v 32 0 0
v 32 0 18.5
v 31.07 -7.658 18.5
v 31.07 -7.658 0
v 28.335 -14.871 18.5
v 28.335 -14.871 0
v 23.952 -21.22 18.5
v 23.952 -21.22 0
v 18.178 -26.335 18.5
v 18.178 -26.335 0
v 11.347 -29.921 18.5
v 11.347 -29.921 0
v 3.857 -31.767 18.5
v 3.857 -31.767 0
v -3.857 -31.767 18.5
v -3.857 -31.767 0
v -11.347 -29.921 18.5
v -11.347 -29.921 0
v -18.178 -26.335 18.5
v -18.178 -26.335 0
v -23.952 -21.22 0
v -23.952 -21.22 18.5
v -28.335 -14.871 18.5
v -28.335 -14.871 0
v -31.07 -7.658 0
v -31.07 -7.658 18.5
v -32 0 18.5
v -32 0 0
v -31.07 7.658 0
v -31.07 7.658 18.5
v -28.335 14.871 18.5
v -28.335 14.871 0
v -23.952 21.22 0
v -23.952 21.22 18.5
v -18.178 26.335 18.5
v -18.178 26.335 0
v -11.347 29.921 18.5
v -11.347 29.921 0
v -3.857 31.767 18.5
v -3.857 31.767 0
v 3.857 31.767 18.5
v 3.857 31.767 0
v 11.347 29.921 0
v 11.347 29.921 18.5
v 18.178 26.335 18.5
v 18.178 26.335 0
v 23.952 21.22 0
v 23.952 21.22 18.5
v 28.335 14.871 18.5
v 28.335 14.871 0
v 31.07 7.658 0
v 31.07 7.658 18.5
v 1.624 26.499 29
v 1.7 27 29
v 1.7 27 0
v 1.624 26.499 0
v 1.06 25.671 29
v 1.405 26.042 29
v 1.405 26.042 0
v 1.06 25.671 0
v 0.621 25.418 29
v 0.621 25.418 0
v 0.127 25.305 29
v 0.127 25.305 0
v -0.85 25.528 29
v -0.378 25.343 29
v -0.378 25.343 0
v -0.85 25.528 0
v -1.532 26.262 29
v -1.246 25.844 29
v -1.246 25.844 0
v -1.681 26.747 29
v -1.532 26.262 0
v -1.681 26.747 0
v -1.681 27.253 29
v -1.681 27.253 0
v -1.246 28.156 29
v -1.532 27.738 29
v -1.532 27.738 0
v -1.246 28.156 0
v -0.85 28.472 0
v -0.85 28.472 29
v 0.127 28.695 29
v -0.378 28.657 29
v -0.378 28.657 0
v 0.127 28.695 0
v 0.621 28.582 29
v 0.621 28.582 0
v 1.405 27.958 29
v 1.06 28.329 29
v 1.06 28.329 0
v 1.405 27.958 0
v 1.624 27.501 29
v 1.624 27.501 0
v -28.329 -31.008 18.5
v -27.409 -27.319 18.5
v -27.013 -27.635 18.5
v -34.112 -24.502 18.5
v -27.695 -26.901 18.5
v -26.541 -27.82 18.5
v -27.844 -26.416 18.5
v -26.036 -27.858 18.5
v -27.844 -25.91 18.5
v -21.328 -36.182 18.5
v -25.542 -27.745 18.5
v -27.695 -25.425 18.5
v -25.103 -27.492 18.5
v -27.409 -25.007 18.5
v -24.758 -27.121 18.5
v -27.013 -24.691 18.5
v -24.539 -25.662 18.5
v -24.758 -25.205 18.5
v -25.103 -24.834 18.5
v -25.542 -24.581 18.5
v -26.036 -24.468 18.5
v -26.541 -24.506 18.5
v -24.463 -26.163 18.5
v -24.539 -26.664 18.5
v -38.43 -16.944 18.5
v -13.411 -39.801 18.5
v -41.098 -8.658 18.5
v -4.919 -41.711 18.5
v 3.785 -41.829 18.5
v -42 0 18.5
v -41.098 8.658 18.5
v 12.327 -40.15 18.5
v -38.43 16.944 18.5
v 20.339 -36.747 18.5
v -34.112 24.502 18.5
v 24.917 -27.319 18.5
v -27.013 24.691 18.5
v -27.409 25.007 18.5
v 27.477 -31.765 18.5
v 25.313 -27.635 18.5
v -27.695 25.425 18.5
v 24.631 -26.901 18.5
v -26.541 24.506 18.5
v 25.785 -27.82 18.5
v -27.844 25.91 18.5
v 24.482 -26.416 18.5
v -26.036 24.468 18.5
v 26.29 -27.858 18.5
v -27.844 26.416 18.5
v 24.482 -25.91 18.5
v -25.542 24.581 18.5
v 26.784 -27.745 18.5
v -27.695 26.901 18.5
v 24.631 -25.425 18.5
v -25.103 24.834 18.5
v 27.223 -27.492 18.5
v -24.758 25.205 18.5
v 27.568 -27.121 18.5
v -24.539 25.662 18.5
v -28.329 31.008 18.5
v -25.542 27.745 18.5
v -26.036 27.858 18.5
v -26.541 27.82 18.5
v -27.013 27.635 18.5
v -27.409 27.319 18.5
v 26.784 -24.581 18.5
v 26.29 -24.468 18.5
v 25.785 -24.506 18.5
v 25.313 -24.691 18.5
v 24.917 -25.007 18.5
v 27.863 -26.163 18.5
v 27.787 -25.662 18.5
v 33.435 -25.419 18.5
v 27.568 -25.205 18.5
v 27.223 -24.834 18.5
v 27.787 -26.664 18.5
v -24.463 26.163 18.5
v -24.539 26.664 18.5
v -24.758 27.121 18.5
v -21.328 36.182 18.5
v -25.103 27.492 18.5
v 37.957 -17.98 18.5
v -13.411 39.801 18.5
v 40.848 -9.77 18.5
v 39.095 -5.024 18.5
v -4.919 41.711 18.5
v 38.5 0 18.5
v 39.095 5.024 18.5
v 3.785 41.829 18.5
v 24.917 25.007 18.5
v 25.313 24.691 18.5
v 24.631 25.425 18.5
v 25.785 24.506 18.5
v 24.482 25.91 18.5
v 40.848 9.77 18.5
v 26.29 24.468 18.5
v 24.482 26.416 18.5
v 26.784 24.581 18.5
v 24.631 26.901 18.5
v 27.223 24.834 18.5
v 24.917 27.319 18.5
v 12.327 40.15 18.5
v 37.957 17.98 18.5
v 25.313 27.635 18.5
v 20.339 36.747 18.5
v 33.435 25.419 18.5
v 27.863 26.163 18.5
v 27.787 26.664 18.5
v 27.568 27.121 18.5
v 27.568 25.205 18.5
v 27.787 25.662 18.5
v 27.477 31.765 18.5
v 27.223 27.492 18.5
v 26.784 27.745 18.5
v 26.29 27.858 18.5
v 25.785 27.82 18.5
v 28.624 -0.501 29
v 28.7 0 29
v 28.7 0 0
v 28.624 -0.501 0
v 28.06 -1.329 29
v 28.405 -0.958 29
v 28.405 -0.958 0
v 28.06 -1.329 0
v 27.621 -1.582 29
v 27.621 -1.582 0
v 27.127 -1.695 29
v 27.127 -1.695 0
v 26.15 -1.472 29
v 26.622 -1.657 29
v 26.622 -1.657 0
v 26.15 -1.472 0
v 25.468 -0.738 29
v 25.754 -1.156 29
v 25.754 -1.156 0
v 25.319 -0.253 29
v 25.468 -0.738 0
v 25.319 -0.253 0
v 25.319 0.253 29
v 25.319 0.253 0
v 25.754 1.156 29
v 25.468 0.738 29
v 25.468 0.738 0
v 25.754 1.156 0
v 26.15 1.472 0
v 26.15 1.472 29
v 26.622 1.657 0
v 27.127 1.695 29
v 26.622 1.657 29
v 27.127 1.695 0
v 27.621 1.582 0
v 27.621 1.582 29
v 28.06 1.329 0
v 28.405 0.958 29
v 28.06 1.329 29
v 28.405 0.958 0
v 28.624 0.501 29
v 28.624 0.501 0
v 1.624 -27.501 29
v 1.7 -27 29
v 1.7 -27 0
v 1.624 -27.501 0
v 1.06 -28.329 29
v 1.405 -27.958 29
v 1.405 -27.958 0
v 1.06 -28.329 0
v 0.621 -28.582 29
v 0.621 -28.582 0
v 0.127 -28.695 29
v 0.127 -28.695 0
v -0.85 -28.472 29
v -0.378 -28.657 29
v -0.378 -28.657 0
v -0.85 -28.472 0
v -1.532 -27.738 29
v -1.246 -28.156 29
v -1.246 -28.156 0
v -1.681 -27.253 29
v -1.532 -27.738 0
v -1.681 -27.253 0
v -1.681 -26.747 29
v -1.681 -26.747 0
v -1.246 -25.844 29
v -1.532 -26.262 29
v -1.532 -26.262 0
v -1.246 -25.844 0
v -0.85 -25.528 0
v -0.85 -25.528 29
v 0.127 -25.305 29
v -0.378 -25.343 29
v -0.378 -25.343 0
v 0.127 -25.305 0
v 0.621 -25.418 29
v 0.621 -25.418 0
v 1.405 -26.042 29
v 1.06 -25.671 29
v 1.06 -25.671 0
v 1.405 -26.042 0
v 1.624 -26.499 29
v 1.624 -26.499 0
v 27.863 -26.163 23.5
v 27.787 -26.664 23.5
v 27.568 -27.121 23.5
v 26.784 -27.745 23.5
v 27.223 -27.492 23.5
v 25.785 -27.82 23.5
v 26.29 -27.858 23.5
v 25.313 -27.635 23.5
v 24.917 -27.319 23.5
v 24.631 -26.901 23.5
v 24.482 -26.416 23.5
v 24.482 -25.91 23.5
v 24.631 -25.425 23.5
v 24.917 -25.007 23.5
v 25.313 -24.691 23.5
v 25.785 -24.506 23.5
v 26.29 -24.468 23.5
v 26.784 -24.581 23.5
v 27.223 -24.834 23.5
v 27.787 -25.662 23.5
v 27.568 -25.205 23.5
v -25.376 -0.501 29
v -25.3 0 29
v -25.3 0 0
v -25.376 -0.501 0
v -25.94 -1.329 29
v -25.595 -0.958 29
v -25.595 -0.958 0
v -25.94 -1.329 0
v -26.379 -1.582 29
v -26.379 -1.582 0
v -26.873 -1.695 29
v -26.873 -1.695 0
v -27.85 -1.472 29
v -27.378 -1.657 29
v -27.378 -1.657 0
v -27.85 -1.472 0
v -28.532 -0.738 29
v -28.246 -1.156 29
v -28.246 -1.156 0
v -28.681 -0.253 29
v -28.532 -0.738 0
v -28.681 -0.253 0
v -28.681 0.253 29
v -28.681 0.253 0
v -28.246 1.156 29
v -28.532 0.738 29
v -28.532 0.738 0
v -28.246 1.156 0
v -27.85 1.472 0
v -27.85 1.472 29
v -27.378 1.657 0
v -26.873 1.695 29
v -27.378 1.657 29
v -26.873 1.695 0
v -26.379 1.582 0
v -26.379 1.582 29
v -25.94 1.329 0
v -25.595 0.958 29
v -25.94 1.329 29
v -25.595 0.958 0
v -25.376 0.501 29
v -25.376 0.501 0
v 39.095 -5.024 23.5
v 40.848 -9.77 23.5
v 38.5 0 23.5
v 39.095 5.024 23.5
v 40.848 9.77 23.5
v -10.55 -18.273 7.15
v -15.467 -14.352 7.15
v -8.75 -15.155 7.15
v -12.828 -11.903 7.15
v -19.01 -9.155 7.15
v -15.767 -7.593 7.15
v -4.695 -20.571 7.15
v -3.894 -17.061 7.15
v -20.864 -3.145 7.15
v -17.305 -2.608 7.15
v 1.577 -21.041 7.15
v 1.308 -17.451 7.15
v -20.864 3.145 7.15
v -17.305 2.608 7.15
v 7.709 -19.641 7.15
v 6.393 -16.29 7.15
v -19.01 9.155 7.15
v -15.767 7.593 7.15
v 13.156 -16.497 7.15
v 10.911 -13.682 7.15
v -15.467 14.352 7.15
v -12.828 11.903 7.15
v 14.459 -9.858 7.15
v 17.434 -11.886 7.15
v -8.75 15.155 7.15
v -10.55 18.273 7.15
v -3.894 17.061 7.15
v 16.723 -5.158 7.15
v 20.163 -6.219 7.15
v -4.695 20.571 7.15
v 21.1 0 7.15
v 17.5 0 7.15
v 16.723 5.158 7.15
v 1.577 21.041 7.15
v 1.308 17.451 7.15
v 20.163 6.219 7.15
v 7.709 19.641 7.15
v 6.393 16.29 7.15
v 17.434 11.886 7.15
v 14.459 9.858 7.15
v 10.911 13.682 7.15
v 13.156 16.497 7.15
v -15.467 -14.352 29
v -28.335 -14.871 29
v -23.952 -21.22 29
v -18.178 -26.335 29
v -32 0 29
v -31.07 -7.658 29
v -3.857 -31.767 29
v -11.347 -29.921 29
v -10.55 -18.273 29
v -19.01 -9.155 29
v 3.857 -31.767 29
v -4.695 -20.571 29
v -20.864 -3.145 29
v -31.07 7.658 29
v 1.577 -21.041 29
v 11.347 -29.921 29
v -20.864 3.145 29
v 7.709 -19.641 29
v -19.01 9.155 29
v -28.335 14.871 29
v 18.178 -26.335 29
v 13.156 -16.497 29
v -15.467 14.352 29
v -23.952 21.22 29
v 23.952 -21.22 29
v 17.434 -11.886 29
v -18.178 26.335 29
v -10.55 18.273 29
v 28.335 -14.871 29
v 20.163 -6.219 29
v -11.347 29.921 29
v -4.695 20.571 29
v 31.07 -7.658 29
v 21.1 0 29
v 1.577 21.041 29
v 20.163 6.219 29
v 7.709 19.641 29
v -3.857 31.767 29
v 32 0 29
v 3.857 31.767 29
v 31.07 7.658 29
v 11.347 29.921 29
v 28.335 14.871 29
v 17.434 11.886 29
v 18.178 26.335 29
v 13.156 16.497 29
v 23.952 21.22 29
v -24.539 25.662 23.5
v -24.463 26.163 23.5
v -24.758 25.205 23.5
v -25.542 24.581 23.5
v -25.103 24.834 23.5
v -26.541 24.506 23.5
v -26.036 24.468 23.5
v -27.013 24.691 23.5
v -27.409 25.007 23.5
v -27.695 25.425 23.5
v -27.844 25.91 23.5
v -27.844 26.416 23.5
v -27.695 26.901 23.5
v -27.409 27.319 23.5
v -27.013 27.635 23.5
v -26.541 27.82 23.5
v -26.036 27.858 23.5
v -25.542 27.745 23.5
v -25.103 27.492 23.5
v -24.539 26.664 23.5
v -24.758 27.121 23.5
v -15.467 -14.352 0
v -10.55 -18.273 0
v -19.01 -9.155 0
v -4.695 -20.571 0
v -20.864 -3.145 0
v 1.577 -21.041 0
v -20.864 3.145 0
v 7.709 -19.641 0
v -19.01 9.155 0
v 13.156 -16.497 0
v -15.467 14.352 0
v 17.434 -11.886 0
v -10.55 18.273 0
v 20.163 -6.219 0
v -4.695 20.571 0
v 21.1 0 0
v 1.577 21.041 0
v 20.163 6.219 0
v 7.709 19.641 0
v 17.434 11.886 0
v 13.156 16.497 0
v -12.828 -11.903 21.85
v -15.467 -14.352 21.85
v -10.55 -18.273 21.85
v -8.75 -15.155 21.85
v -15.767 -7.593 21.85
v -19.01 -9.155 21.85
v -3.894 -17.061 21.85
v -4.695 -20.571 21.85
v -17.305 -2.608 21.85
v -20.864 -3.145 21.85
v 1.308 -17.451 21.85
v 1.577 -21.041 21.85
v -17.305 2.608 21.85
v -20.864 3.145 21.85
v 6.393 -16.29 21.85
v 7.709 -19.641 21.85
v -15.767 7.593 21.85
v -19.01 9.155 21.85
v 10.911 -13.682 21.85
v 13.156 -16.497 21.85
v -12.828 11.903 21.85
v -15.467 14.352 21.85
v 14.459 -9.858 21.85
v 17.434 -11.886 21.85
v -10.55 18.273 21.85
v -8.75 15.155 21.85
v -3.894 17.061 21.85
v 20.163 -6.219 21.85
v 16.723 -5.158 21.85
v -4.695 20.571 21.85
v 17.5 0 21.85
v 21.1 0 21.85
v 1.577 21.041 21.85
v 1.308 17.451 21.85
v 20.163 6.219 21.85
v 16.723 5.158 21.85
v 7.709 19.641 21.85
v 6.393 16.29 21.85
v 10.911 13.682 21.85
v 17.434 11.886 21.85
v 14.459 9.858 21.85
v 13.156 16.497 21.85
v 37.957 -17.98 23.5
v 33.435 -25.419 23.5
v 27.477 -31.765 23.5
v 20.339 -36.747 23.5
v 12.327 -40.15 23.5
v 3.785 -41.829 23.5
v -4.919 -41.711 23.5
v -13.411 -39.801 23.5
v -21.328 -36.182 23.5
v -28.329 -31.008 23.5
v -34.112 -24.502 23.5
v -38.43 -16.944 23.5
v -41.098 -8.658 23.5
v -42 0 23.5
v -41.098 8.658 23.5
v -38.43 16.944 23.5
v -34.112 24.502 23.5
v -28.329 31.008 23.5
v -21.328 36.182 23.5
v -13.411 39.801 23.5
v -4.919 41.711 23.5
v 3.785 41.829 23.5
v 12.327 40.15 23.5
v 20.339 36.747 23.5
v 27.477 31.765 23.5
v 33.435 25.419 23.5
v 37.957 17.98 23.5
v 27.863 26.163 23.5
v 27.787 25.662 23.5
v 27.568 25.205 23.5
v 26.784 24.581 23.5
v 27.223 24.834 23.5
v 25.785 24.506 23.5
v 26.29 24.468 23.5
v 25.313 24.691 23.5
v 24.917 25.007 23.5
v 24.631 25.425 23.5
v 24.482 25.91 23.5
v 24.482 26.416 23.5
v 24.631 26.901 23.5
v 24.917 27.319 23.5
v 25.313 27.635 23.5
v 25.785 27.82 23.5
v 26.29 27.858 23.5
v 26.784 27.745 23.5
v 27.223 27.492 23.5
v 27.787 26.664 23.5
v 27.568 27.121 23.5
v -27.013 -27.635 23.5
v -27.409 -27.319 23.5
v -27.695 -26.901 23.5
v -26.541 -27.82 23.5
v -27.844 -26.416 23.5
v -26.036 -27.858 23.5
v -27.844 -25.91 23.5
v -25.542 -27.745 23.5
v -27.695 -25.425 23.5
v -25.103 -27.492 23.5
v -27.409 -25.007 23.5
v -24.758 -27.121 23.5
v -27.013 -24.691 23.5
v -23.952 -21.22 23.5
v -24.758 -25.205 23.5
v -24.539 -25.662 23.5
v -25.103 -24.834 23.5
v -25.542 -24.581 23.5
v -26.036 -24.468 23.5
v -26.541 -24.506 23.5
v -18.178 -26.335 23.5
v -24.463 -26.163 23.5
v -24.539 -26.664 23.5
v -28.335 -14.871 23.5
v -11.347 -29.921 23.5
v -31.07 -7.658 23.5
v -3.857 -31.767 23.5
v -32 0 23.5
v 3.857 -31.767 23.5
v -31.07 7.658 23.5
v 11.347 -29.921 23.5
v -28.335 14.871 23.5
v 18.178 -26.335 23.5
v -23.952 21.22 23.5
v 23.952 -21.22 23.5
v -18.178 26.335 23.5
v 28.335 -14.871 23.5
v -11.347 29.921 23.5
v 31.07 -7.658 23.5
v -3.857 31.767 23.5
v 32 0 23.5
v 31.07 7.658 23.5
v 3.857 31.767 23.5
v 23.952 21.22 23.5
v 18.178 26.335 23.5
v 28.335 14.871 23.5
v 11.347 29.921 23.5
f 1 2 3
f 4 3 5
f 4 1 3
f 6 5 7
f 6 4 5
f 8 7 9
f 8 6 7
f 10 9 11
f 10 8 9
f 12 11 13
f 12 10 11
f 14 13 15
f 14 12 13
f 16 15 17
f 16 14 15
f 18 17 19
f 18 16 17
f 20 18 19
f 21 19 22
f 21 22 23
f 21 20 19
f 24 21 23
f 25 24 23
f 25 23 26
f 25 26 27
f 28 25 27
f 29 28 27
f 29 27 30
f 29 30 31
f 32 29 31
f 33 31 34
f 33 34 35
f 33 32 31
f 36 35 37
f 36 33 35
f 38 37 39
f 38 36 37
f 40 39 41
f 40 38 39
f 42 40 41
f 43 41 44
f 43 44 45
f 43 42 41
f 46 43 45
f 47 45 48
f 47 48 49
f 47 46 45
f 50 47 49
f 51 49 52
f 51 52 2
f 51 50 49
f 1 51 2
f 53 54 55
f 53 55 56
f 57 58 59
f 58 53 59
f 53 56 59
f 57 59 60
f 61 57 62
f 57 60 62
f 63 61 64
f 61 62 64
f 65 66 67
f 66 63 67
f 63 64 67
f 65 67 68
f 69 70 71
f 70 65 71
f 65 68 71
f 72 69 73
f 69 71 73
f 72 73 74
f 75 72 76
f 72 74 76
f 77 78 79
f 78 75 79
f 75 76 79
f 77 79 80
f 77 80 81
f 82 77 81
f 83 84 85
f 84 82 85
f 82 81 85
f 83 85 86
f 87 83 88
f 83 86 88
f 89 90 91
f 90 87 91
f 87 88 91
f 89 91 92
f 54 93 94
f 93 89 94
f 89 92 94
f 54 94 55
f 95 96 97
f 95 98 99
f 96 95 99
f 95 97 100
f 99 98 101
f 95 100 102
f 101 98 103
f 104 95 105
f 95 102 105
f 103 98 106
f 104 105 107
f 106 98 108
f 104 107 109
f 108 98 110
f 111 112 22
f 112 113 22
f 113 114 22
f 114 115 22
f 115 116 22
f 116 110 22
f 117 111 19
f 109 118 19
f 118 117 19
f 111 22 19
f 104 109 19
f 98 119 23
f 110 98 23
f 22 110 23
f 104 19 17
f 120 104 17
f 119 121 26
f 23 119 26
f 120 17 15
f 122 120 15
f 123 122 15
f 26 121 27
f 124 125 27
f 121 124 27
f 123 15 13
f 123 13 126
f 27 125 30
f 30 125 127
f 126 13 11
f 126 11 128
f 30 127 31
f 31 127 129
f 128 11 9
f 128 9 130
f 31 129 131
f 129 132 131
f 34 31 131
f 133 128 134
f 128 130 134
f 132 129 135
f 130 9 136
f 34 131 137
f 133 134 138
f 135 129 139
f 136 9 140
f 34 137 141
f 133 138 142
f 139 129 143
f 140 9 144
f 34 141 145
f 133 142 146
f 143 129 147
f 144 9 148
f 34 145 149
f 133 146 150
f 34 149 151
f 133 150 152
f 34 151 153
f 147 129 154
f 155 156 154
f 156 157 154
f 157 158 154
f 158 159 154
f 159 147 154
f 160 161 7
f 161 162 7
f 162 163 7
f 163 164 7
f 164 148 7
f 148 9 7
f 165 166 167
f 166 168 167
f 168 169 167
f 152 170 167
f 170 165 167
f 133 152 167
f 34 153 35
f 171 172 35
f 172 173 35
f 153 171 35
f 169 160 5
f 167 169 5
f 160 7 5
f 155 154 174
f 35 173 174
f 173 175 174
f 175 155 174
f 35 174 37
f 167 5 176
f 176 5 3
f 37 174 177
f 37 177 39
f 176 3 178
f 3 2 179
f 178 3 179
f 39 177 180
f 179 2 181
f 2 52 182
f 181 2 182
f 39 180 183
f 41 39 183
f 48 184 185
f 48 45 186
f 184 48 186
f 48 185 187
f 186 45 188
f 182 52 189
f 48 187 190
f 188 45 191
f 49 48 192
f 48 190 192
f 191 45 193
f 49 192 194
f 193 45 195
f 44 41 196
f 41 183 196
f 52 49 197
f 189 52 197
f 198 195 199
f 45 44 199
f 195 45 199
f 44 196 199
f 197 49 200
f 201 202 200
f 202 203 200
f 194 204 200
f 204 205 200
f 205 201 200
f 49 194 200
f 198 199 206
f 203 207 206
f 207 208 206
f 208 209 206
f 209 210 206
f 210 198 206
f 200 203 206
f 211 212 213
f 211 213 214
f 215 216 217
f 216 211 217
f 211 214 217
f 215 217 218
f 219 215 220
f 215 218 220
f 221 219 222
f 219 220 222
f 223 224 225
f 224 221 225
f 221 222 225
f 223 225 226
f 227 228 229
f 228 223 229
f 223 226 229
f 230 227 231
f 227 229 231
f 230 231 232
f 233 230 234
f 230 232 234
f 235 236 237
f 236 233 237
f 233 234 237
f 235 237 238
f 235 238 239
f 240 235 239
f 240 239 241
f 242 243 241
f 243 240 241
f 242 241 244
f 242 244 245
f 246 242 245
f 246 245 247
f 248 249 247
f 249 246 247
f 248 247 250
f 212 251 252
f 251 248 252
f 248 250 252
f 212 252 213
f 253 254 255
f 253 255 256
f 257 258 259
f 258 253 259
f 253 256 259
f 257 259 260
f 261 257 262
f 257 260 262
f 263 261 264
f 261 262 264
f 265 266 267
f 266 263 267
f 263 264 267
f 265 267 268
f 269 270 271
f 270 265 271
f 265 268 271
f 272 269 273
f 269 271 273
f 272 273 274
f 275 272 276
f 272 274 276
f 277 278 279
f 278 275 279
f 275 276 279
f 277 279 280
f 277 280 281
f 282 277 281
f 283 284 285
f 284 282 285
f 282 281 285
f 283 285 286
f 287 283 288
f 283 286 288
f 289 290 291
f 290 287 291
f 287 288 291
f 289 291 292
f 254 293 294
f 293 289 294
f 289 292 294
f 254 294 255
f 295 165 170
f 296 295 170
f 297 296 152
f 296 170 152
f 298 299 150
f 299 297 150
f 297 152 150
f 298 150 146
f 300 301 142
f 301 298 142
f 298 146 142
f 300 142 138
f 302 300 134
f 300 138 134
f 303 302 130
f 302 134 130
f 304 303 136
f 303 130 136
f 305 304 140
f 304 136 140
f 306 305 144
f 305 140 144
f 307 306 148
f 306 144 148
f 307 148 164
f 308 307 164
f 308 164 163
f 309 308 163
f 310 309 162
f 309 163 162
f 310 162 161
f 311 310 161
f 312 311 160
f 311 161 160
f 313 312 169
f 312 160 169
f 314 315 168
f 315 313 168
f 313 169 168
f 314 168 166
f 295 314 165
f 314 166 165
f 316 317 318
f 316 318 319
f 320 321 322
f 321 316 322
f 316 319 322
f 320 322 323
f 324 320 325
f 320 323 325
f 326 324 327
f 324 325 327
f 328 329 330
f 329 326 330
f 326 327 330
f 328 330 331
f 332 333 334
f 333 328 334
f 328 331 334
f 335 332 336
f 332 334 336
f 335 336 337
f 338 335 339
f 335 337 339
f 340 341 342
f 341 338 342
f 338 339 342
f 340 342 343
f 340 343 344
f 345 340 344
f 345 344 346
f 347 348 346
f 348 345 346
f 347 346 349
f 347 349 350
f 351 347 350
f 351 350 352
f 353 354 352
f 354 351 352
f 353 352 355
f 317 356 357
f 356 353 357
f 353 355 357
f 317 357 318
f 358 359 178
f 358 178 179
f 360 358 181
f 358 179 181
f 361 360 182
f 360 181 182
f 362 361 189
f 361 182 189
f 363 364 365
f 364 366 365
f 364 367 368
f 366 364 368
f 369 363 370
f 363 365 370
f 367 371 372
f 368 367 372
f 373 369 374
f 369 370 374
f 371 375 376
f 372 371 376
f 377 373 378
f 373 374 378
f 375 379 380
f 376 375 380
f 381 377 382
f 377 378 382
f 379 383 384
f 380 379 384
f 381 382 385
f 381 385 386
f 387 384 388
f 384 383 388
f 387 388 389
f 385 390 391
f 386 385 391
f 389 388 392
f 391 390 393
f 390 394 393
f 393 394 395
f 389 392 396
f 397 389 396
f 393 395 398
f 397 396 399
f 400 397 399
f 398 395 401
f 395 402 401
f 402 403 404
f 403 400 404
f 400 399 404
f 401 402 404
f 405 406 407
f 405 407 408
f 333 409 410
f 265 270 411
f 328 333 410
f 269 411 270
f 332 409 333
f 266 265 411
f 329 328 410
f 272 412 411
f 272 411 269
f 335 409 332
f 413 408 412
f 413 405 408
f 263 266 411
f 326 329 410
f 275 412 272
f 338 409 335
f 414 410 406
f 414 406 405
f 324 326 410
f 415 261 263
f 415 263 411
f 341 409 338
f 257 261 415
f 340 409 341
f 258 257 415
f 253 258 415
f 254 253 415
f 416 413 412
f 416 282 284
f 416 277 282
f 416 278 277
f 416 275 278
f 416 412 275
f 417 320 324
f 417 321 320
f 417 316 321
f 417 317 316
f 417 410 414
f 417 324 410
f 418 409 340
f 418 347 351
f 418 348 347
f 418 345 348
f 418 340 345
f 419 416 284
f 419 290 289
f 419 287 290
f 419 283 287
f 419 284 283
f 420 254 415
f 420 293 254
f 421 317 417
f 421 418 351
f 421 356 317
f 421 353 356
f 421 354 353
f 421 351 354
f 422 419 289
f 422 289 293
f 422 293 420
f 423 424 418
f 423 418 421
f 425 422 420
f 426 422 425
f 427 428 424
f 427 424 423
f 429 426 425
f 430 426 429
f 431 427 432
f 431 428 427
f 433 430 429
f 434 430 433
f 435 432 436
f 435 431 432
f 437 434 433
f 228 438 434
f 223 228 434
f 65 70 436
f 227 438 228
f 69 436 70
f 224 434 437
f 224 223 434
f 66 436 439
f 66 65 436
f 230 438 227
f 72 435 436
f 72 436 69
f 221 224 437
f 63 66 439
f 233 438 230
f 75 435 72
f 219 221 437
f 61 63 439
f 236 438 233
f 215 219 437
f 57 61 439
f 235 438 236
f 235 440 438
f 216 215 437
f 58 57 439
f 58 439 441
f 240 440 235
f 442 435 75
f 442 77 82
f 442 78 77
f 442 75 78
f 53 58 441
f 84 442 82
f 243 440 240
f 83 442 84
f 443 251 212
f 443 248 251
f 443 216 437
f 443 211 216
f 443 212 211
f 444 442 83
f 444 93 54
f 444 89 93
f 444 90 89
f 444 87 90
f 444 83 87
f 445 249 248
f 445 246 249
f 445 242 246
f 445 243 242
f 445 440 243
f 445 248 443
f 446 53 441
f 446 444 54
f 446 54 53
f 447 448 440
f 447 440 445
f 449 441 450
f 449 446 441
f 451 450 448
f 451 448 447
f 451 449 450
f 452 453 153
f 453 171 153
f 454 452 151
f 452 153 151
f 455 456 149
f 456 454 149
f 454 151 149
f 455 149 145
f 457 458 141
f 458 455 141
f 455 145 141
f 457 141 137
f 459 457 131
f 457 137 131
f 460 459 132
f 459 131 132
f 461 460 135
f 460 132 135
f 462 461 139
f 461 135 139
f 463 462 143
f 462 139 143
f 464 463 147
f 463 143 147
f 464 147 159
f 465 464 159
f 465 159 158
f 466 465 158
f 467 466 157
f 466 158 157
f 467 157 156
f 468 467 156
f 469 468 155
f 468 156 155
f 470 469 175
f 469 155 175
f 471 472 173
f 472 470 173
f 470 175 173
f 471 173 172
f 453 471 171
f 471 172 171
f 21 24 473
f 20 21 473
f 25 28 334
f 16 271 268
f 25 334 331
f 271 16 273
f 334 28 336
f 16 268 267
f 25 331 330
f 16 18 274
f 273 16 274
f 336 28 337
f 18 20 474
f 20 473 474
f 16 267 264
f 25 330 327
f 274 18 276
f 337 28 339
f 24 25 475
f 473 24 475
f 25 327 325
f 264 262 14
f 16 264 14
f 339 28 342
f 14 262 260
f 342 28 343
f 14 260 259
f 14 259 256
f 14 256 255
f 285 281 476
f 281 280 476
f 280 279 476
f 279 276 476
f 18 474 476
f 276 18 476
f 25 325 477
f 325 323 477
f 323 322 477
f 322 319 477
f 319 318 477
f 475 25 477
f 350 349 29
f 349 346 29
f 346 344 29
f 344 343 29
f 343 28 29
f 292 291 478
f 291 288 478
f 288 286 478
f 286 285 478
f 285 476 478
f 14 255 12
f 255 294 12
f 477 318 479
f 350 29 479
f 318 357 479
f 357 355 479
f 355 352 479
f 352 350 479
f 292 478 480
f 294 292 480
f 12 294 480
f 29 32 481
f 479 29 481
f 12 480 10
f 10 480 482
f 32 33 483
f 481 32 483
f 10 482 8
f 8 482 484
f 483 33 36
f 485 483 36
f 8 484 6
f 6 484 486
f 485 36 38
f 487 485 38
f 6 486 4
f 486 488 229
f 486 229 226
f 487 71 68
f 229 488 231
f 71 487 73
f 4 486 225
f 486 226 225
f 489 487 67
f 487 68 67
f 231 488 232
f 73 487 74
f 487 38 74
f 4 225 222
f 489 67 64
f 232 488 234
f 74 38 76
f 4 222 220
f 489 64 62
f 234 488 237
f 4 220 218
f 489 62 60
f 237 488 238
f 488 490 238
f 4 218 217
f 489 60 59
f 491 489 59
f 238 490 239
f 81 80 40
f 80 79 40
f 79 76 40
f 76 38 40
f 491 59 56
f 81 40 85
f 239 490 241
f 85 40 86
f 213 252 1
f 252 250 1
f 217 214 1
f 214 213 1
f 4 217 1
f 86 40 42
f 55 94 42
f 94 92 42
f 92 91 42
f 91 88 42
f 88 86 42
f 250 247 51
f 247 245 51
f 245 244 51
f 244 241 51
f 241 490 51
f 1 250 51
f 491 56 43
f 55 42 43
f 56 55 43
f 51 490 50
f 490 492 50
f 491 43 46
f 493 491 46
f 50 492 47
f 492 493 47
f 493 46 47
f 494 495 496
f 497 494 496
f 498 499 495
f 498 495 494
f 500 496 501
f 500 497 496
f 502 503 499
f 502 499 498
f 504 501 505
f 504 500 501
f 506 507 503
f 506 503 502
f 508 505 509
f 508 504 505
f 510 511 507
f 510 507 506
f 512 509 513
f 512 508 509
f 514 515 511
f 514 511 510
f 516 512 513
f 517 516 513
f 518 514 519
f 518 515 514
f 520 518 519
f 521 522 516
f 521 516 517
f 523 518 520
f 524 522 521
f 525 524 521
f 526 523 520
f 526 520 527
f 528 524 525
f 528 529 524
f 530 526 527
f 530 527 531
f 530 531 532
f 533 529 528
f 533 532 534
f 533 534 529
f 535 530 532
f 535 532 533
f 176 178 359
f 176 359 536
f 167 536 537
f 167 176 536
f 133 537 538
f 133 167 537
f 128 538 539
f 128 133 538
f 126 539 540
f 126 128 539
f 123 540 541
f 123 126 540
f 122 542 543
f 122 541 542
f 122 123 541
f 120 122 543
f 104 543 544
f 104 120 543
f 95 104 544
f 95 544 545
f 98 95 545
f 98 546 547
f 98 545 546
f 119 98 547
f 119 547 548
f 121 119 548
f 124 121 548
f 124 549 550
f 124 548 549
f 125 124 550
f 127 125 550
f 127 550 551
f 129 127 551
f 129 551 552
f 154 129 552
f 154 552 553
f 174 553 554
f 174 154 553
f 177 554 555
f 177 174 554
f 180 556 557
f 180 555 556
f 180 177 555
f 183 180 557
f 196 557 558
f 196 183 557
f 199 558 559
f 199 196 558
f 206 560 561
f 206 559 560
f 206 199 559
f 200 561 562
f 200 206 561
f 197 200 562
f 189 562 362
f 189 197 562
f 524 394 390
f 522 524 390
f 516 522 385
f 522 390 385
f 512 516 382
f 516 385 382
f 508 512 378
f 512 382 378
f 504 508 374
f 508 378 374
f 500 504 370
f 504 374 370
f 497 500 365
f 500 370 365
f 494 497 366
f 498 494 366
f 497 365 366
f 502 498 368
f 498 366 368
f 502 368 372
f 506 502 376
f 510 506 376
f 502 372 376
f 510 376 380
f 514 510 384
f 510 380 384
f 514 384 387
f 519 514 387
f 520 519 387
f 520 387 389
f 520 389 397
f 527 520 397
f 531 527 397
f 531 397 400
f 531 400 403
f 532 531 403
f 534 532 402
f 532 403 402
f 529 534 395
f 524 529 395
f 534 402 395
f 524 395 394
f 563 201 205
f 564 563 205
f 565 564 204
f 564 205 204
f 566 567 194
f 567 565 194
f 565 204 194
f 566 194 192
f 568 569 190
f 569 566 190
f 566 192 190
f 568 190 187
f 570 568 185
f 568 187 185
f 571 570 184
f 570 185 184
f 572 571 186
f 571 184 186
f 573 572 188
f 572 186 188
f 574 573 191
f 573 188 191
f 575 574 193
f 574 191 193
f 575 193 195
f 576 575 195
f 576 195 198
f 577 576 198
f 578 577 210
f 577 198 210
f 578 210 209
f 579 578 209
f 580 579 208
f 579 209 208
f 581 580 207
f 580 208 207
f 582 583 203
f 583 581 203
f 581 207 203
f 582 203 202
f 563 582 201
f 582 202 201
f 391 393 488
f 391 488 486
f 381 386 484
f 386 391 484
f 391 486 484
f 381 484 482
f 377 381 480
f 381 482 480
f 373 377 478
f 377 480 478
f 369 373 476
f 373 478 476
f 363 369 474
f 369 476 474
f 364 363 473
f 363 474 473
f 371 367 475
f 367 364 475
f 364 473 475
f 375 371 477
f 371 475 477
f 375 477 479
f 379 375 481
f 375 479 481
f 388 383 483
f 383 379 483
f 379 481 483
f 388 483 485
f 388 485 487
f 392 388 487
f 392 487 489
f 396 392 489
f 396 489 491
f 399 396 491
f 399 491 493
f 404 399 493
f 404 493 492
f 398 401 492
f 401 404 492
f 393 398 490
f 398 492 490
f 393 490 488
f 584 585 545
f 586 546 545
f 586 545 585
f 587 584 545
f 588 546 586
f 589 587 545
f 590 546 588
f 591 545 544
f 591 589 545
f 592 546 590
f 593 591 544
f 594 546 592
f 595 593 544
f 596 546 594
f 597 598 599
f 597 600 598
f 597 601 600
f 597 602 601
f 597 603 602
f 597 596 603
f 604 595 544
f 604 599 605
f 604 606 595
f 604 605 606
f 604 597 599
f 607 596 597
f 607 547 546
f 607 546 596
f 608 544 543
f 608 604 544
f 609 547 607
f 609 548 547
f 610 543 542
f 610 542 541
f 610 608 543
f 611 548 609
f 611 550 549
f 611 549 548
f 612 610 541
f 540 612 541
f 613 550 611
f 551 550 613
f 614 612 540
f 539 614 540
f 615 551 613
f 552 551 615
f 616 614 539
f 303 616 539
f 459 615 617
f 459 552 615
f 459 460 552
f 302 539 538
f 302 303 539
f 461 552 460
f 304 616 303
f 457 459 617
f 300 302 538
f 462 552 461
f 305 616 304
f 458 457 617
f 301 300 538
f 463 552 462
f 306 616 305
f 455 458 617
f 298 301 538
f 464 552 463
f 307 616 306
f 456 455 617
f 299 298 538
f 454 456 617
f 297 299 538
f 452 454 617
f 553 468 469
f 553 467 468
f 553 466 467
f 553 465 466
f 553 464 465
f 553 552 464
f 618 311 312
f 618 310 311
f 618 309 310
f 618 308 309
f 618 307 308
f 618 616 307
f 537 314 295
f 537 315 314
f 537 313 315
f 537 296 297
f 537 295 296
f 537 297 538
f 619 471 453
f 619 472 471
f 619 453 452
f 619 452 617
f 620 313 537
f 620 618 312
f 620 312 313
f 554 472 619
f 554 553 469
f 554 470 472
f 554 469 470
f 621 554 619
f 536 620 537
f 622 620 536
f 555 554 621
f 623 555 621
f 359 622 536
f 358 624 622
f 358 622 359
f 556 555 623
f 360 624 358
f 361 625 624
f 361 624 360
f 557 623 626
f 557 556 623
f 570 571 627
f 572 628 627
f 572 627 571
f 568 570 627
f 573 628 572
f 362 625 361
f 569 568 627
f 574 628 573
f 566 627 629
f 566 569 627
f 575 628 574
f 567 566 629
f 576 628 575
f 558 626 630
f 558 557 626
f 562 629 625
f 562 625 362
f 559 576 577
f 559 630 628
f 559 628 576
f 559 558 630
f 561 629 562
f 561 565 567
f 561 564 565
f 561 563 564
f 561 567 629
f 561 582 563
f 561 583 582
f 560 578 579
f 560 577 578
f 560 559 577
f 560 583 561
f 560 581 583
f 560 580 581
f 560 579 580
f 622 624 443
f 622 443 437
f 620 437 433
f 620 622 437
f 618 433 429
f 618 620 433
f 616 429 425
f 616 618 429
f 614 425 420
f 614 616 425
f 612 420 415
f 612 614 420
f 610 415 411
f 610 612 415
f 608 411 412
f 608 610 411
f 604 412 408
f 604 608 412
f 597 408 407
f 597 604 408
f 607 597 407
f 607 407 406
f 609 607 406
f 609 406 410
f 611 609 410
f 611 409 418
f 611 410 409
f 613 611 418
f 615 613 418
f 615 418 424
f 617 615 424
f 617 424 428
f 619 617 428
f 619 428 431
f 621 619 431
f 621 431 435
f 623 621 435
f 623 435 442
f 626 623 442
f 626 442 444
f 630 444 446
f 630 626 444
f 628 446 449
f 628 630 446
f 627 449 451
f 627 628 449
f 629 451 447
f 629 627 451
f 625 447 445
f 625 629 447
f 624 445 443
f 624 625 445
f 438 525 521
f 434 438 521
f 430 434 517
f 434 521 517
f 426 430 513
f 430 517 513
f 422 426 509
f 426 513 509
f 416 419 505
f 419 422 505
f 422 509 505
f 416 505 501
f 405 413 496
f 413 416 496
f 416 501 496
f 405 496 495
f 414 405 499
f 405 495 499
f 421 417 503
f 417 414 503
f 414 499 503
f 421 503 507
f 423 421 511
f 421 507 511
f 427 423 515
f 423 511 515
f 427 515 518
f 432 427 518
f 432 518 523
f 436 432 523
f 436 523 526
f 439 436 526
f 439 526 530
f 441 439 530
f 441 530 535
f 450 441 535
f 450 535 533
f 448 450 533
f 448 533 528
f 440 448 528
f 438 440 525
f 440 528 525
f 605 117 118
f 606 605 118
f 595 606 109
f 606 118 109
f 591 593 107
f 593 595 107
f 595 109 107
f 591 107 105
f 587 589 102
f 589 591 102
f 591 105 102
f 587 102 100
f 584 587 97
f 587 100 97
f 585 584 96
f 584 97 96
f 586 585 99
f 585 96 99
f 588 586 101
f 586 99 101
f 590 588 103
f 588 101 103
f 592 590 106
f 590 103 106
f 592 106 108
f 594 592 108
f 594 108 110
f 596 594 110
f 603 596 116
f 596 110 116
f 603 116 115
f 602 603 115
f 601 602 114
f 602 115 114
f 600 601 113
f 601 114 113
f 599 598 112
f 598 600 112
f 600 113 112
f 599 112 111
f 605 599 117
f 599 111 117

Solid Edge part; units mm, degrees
sketch "Sketch1" plane through (0, 0, 0) normal (0, 0, 1) x (1, 0, 0)
  circle A0 centre (0, 0) radius 32
  circle A1 centre (0, 0) radius 21.1
  circle A2 centre (27, 0) radius 1.7
  circle A3 centre (0, 27) radius 1.7
  circle A4 centre (-27, 0) radius 1.7
  circle A5 centre (0, -27) radius 1.7
extrude "Protrusion1" add sketch "Sketch1" along normal blind 7.15
sketch "Sketch2" plane through (0, 0, 7.15) normal (0, 0, 1) x (1, 0, 0)
  circle A0 centre (0, 0) radius 32
  circle A1 centre (0, 0) radius 17.5
  circle A2 centre (27, 0) radius 1.7
  circle A3 centre (0, 27) radius 1.7
  circle A4 centre (-27, 0) radius 1.7
  circle A5 centre (0, -27) radius 1.7
extrude "ExtrudedProtrusion_2" add sketch "Sketch2" along normal blind 14.7
sketch "Sketch3" plane through (0, 0, 21.85) normal (0, 0, 1) x (1, 0, 0)
  circle A0 centre (0, 0) radius 32
  circle A1 centre (0, 0) radius 21.1
  circle A2 centre (27, 0) radius 1.7
  circle A3 centre (0, 27) radius 1.7
  circle A4 centre (-27, 0) radius 1.7
  circle A5 centre (0, -27) radius 1.7
extrude "ExtrudedProtrusion_3" add sketch "Sketch3" along normal blind 7.15
sketch "Sketch4" plane through (0, 0, 18.5) normal (0, 0, 1) x (1, 0, 0)
  circle A0 centre (0, 0) radius 42
  circle A1 centre (0, 0) radius 17.5
  circle A2 centre (27, 0) radius 1.7
  circle A3 centre (0, 27) radius 1.7
  circle A4 centre (-27, 0) radius 1.7
  circle A5 centre (0, -27) radius 1.7
  circle A6 centre (26.163, 26.163) radius 1.7
  circle A7 centre (-26.163, 26.163) radius 1.7
  circle A8 centre (-26.163, -26.163) radius 1.7
  circle A9 centre (26.163, -26.163) radius 1.7
extrude "ExtrudedProtrusion_4" add sketch "Sketch4" along normal blind 5
sketch "Sketch5" plane through (0, 0, 21.85) normal (0, 0, 1) x (1, 0, 0)
  circle A0 centre (0, 0) radius 21.1
extrude "ExtrudedCutout_1" cut sketch "Sketch5" along normal blind 7.15
sketch "Sketch6" plane through (0, 0, 18.5) normal (0, 0, 1) x (1, 0, 0)
  circle A0 centre (60, 0) radius 21.5
extrude "ExtrudedCutout_2" cut sketch "Sketch6" along normal blind 5
